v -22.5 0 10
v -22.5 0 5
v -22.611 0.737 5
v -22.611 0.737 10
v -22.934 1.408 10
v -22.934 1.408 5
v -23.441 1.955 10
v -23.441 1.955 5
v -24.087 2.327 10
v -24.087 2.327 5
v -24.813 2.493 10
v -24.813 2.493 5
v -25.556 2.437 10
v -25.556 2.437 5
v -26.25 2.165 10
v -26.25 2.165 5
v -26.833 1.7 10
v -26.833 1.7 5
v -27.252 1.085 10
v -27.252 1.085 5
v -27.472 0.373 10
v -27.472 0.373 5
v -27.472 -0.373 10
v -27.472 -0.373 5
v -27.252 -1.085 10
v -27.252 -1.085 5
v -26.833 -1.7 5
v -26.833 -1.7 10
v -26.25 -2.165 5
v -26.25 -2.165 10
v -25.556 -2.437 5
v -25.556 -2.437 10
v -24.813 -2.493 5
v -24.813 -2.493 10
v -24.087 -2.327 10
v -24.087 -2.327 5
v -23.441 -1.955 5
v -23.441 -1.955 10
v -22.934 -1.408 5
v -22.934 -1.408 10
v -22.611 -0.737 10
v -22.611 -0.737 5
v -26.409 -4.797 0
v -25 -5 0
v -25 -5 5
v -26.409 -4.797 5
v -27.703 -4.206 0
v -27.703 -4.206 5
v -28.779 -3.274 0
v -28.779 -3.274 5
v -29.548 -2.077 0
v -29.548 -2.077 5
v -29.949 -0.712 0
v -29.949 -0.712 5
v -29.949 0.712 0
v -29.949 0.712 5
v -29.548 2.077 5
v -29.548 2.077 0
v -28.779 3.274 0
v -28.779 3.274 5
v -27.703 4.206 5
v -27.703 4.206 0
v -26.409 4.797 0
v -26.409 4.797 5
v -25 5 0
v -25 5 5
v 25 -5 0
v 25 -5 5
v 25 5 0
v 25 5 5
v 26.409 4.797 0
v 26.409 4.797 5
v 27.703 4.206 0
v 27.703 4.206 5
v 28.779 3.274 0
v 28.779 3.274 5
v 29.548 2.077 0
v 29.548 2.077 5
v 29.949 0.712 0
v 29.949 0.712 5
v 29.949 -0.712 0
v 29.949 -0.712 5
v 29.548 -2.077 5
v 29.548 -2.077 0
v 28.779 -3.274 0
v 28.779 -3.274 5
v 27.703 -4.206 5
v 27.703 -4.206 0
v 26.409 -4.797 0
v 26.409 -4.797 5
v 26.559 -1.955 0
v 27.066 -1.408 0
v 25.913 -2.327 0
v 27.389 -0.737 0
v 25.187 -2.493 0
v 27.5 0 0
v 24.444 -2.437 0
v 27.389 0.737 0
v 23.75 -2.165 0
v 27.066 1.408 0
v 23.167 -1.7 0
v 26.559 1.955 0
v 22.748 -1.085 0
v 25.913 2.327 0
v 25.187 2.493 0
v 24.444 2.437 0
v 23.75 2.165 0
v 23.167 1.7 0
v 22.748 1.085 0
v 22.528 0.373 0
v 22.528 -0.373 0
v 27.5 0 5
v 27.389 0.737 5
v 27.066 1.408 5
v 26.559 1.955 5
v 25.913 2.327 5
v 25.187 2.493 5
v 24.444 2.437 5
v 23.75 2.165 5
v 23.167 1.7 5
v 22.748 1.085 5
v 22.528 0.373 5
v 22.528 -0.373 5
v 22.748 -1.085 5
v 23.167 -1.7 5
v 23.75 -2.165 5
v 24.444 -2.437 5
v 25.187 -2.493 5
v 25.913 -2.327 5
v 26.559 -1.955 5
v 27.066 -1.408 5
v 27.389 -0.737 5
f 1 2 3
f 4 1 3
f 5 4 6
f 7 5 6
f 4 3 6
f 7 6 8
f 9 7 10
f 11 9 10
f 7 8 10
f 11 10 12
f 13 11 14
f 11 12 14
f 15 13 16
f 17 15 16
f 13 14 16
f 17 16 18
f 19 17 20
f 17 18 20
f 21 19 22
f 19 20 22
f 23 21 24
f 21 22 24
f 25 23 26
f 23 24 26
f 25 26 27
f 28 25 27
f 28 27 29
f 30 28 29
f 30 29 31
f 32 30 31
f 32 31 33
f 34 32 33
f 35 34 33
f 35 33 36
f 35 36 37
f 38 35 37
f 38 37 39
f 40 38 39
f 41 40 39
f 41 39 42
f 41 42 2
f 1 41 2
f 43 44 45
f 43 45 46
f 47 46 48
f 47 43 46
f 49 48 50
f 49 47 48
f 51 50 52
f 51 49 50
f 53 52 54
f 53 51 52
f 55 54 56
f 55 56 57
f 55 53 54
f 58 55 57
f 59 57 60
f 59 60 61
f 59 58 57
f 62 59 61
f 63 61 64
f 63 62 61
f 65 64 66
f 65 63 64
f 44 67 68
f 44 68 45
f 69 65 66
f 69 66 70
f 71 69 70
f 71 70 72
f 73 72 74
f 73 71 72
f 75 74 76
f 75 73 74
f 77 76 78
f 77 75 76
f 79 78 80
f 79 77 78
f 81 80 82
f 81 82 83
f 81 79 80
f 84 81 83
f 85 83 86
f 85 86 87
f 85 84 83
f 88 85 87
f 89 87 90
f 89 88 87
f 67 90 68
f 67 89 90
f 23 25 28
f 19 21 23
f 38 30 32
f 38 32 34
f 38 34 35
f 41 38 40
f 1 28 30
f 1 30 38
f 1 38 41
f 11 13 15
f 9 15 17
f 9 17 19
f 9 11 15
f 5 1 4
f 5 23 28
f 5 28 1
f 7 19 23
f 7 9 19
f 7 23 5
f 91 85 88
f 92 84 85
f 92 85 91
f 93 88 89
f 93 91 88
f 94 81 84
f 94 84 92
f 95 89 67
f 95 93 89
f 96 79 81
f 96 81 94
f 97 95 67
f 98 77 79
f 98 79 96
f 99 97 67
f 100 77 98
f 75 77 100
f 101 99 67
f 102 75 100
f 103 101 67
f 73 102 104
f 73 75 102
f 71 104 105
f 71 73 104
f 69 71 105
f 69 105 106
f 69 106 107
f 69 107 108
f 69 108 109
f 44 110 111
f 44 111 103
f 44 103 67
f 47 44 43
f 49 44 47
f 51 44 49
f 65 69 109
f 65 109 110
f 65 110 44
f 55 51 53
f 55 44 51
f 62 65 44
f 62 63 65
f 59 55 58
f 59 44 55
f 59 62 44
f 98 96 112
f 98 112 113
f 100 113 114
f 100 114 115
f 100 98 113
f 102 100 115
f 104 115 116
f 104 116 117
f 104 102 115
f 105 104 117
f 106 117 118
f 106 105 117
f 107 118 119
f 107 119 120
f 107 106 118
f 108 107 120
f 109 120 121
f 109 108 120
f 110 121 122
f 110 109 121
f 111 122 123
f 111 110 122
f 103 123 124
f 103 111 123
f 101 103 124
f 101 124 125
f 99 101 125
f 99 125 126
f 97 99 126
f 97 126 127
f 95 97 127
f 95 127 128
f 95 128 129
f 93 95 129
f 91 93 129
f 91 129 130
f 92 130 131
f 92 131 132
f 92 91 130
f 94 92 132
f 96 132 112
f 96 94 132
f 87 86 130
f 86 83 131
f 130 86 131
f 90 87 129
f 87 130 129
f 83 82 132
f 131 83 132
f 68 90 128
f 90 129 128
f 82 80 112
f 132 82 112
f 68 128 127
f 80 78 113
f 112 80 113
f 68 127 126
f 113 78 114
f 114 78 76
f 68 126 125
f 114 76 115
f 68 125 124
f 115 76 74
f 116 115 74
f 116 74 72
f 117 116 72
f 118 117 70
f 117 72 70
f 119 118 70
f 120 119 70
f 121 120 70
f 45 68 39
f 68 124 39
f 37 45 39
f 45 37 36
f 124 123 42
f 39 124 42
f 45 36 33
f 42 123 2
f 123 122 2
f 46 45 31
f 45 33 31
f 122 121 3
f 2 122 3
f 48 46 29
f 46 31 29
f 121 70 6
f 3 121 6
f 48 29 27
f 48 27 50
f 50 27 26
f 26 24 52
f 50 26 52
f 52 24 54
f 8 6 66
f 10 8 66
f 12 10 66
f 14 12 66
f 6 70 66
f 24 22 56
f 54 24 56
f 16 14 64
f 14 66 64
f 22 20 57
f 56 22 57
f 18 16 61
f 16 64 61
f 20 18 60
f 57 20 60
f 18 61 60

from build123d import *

# Parameters (mm, degrees)
SKETCH1_R           = 2.5
BOSS_EXTRUDE1_DEPTH = 5
SKETCH1_2_R         = 2.5
BOSS_EXTRUDE2_DEPTH = 10


with BuildPart() as part:
    # Sketch1 → Boss-Extrude1 (new body)
    with BuildSketch(Plane.XY):
        with BuildLine():
            Line((-25, 5), (25, 5))
            ThreePointArc((25, 5), (30, 0), (25, -5))
            Line((25, -5), (-25, -5))
            ThreePointArc((-25, -5), (-30, 0), (-25, 5))
        make_face()
        with Locations((-25, 0)):
            Circle(SKETCH1_R, mode=Mode.SUBTRACT)
        with Locations((25, 0)):
            Circle(SKETCH1_R, mode=Mode.SUBTRACT)
    extrude(amount=BOSS_EXTRUDE1_DEPTH)

    # Sketch1<2> → Boss-Extrude2 (add)
    with BuildSketch(Plane.XY):
        with Locations((-25, 0)):
            Circle(SKETCH1_2_R)
    extrude(amount=BOSS_EXTRUDE2_DEPTH)


solid = part.part
